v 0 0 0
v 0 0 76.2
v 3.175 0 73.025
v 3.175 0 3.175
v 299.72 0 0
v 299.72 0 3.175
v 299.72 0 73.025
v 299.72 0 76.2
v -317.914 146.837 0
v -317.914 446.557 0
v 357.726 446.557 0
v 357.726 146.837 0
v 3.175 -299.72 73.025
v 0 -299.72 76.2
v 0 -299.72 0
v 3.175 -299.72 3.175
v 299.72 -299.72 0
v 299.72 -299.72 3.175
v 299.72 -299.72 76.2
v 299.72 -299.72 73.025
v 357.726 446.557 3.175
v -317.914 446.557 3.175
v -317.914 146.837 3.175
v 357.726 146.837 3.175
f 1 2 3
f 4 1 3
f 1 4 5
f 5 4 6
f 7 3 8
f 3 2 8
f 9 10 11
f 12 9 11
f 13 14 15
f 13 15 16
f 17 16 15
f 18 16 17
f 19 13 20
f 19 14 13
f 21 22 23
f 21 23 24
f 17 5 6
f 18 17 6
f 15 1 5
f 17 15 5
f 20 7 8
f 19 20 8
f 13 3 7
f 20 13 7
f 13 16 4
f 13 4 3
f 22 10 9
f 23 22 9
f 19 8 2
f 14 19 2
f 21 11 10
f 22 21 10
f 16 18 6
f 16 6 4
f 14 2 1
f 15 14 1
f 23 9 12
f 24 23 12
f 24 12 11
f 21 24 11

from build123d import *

# Parameters (mm, degrees)
F1_DEPTH = 299.72
F3_DEPTH = 3.175


with BuildPart() as f1:
    # F0 (on Front) → F1 (new body)
    with BuildSketch(Plane.XZ):
        Polygon((0, 76.2), (0, 0), (299.72, 0), (299.72, 3.175), (3.175, 3.175), (3.175, 73.025), (299.72, 73.025), (299.72, 76.2), align=None)
    extrude(amount=F1_DEPTH)


with BuildPart() as f3:
    # F2 (on Top) → F3 (new body)
    with BuildSketch(Plane.XY):
        Polygon((-317.913711, 446.55716), (-317.913711, 146.83716), (-18.193711, 146.83716), (58.006289, 146.83716), (357.726289, 146.83716), (357.726289, 446.55716), (58.006289, 446.55716), (-18.193711, 446.55716), align=None)
    extrude(amount=F3_DEPTH)


solid = Compound([f1.part, f3.part])
